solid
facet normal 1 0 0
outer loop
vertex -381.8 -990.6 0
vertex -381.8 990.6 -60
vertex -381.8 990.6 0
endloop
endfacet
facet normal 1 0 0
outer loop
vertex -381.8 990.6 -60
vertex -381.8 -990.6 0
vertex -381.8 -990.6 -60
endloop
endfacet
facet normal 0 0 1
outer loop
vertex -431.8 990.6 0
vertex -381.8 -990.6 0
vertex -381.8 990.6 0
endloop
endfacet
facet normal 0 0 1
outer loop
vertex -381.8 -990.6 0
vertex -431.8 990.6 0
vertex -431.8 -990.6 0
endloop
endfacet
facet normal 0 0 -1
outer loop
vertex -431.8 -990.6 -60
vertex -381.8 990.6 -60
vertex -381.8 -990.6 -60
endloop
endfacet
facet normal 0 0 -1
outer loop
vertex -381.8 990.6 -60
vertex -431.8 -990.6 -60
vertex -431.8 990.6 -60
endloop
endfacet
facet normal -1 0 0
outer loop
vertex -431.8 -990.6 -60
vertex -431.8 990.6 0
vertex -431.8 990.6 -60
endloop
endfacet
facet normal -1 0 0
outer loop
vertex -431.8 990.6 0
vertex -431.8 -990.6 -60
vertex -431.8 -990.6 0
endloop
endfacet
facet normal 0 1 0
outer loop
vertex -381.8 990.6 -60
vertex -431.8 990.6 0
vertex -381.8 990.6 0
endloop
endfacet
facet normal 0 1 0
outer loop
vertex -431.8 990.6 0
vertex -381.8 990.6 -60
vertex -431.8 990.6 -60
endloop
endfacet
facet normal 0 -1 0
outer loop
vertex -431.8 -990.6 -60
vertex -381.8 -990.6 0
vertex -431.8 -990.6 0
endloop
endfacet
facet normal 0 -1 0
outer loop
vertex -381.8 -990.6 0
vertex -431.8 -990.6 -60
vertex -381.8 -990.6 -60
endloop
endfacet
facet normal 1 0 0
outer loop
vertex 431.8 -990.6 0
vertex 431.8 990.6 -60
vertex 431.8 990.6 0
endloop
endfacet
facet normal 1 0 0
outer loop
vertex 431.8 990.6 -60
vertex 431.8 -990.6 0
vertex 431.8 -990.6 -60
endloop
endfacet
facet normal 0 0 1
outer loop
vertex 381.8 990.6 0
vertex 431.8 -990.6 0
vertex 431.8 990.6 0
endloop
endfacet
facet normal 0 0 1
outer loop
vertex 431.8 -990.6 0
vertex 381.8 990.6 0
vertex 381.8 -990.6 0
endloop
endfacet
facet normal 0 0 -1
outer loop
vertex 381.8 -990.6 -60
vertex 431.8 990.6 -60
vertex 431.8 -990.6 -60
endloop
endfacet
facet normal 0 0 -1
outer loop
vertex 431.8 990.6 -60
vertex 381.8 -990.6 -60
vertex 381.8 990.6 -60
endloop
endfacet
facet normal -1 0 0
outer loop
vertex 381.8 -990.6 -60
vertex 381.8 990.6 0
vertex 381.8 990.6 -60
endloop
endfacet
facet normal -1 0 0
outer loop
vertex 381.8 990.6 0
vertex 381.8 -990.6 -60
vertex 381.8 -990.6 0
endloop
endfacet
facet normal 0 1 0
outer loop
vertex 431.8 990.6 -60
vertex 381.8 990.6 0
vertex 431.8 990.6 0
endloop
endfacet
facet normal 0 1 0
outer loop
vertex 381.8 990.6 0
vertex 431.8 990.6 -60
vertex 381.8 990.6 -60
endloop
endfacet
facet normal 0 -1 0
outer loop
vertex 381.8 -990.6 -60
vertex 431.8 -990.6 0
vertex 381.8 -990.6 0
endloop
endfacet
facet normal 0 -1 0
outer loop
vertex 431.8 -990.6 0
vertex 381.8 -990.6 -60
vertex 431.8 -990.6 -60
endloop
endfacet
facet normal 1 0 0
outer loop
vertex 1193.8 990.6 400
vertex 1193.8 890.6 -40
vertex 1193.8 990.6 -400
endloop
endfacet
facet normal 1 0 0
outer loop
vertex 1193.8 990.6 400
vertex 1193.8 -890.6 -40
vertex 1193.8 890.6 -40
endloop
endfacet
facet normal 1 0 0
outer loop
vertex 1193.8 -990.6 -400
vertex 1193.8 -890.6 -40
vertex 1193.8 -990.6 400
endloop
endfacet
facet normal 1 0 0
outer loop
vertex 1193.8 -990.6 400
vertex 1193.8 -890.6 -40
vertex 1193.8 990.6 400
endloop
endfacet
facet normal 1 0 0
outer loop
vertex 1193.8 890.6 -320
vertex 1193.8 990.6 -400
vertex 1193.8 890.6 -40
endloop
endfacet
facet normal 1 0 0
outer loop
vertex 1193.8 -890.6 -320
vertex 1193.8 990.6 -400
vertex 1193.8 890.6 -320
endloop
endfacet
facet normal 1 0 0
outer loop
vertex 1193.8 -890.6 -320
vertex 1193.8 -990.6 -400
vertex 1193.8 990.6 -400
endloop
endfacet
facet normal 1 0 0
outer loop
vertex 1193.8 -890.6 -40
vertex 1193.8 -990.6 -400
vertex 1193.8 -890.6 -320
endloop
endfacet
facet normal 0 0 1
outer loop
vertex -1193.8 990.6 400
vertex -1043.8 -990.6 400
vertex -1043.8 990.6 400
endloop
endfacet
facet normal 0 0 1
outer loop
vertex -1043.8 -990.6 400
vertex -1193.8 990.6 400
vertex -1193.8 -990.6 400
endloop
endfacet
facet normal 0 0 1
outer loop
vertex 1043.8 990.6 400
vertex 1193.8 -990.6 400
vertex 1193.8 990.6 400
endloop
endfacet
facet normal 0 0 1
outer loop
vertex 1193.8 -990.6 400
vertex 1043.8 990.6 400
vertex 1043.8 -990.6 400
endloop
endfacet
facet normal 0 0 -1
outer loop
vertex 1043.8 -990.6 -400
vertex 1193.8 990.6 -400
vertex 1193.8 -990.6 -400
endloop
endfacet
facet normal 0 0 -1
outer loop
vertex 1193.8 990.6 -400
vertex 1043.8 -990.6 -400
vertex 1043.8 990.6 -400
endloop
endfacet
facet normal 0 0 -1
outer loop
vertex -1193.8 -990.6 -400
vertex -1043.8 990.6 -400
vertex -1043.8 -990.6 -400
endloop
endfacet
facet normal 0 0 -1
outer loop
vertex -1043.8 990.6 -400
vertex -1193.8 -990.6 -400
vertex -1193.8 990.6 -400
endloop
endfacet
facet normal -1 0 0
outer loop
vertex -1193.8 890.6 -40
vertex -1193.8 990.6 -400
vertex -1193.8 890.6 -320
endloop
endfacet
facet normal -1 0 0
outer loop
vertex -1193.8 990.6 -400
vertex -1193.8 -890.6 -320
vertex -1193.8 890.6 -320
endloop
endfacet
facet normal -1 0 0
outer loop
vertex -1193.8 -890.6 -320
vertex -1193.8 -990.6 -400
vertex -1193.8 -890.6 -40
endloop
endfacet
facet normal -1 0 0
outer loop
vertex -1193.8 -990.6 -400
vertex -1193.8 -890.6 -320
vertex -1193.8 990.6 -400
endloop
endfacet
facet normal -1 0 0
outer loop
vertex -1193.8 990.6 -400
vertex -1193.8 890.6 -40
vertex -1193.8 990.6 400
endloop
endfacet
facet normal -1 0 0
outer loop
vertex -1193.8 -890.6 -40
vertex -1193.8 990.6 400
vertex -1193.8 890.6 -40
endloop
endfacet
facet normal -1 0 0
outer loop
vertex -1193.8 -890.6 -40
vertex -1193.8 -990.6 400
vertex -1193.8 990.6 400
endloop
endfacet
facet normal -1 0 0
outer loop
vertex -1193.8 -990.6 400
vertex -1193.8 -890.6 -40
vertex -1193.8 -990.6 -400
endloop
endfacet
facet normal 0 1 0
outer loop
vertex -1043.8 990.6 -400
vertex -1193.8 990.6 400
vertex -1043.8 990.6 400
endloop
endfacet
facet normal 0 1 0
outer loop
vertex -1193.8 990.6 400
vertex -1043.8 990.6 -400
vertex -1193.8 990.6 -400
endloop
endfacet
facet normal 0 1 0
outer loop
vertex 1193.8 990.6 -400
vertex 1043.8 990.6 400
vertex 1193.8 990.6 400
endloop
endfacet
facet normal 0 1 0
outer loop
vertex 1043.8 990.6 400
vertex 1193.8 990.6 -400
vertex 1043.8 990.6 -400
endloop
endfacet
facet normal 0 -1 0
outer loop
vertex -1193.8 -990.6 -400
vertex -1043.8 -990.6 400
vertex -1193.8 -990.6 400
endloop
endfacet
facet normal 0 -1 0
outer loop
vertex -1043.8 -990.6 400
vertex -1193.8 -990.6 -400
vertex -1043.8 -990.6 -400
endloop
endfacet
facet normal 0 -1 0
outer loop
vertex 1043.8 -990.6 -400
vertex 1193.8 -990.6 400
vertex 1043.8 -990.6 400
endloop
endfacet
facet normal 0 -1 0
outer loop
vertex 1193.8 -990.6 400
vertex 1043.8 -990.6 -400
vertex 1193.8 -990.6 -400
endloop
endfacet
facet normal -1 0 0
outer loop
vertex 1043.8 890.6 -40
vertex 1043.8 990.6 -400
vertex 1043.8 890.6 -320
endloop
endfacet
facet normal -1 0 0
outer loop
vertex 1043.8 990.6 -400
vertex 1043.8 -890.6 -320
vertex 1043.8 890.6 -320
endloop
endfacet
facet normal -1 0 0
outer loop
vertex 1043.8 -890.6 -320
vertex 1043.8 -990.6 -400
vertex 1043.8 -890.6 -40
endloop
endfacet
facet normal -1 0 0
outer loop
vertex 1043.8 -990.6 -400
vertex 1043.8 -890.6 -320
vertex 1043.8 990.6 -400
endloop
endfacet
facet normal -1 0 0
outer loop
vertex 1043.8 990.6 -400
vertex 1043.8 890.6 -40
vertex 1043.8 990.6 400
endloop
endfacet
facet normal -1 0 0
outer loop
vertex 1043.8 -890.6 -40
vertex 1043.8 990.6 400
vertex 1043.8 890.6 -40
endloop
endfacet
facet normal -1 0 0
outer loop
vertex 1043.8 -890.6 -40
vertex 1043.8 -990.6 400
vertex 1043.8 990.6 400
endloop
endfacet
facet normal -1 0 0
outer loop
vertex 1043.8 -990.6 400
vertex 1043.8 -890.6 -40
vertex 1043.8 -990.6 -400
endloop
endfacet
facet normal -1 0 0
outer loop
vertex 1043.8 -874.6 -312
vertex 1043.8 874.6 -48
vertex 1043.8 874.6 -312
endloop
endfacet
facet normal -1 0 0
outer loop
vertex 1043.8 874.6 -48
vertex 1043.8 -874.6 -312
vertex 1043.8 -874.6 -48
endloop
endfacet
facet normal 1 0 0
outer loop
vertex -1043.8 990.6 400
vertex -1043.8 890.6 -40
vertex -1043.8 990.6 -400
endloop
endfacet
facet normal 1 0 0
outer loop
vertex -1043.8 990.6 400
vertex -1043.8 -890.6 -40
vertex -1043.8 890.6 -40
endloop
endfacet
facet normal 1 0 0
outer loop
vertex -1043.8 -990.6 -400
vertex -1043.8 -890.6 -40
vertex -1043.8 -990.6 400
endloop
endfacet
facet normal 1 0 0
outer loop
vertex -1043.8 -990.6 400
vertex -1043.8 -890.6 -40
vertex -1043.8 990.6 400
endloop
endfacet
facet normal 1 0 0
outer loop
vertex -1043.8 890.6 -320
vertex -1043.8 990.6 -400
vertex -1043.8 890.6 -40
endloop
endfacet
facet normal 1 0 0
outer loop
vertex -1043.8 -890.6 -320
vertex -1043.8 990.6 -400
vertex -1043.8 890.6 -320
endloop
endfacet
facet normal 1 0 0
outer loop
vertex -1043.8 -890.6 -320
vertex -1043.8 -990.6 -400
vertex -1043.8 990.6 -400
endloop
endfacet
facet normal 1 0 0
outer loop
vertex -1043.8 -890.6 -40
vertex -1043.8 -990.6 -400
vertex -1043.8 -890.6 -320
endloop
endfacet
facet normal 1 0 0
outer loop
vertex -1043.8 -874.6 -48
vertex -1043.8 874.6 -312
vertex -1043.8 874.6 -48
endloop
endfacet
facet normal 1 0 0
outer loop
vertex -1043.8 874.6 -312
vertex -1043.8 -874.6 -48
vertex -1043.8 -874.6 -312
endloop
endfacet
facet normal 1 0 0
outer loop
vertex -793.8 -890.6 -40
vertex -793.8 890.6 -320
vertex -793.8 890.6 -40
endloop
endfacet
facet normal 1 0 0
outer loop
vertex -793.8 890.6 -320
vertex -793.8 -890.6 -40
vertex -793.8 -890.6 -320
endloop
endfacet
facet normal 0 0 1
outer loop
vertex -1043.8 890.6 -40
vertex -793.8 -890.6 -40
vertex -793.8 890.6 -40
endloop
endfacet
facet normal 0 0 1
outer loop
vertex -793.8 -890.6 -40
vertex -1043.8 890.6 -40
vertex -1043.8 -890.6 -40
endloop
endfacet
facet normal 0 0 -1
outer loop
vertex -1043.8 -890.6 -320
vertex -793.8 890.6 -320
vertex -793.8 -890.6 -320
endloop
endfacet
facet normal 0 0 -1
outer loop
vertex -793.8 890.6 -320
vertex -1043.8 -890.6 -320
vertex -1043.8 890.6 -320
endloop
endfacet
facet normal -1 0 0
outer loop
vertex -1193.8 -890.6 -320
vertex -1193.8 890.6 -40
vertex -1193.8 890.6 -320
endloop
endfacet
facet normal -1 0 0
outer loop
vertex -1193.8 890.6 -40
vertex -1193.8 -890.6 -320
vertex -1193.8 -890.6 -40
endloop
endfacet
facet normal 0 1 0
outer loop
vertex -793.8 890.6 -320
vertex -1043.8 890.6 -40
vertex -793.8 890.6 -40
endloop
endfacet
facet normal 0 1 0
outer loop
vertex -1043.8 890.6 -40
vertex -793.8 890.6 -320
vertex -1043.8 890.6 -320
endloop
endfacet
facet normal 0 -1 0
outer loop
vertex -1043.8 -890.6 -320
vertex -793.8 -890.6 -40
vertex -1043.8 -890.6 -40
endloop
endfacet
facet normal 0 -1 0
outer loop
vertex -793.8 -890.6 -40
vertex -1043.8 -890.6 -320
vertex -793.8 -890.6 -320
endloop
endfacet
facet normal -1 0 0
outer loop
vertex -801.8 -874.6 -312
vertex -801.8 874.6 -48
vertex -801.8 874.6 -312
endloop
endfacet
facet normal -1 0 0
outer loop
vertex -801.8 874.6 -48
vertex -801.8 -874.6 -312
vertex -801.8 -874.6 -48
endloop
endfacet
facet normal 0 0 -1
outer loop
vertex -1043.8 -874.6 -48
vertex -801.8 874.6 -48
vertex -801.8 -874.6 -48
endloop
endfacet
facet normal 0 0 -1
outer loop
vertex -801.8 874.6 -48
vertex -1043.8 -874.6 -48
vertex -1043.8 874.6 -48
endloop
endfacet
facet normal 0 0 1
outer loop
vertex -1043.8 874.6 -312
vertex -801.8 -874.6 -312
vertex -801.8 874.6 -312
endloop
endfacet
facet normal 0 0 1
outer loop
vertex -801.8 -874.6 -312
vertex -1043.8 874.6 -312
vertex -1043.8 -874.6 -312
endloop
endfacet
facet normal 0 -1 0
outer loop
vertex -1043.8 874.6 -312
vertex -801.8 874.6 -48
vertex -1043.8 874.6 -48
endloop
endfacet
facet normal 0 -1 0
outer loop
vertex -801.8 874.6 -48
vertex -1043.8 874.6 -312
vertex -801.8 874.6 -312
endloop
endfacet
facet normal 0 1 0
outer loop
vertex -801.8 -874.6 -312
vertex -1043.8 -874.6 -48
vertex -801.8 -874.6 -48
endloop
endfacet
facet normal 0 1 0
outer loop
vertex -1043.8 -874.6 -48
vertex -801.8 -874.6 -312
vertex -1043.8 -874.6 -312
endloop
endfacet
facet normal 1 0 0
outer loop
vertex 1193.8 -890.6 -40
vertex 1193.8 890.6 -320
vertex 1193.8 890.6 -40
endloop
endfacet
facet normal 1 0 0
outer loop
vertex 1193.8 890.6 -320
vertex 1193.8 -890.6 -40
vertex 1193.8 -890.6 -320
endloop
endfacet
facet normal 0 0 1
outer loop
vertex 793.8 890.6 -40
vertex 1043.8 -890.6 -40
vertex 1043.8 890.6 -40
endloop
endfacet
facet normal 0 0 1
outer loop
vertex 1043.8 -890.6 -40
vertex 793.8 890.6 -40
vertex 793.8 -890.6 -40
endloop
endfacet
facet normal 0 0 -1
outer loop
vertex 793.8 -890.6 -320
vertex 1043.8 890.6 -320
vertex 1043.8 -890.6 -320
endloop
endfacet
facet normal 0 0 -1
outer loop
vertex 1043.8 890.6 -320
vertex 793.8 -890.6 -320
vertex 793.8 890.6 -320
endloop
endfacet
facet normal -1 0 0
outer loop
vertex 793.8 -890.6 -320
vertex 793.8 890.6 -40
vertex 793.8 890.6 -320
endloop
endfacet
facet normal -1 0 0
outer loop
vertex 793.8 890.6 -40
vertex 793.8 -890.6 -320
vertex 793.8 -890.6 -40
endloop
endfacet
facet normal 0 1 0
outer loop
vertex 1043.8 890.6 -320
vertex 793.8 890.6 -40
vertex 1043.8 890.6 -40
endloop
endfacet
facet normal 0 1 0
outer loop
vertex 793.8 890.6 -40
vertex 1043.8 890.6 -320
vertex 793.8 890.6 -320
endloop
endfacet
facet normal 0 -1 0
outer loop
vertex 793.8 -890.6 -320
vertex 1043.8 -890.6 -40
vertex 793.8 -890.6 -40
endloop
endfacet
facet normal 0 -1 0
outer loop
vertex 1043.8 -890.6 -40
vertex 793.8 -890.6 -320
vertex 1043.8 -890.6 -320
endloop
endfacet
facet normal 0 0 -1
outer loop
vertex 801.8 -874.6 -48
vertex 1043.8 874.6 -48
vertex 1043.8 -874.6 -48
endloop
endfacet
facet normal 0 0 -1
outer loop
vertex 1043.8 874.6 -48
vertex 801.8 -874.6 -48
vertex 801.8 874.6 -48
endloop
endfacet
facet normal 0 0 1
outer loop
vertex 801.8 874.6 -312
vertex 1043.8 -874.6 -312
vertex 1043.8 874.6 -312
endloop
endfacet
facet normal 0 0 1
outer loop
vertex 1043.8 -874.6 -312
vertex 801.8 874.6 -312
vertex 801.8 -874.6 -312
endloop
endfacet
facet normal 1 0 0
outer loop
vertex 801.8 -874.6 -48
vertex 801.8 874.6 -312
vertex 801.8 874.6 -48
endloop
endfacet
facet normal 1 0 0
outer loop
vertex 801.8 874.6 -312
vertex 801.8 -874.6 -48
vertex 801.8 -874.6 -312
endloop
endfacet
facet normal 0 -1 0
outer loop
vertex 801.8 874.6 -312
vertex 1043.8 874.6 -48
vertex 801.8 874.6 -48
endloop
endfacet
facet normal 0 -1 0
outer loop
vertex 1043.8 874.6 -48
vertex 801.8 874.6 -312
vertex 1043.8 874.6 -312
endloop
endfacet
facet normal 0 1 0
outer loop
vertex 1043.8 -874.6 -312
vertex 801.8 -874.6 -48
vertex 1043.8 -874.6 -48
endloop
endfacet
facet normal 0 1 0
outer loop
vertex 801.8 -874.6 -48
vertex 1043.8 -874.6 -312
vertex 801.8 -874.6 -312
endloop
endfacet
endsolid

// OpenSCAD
// ====================================================================================
// REVOLUTIONARY TECHNOLOGY COMPANY & UNIVERSITY OF WASHINGTON DEPARTMENT OF PHYSICS
// Module: silverado_md_all_beds.scad (Parametric Multi-Industry Short-Bed Matrix)
// Updates: Optimized for 143.5" Wheelbase Extended King Cab & 6.5-Foot Cargo Limits
// Center Origin (0,0,0) = Mid-point of King Cab-to-Axle (CA) Longitudinal Frame Interface
// ====================================================================================

$fn = 100;

// --- Master Industrial Upfit Selector ---
INDUSTRIAL_BED_VARIANT = 2; // 1=Tow, 2=Utility, 3=EMT, 4=Fire, 5=Police, 6=Dump, 7=Lumber, 8=Box, 9=Military, 10=Anti-Air

// --- Short-Bed Fleet Geometry Parameter Tables ---
inch_to_mm         = 25.4;
bed_length         = 78.0 * inch_to_mm;  // Scaled down to exactly 1981.20 mm for short-bed upfits
bed_width          = 94.0 * inch_to_mm;  // Standard wide-track commercial dually width [INDEX]
mating_rail_w      = 34.0 * inch_to_mm;  // 863.60 mm standard straight truck rail track [INDEX]
tool_box_width     = 400.00;             // Compressed pocket size fitting shorter wheelbase
winch_clearance    = 100.00;             // Mandatory rear winch notch offset [INDEX]

variant_manifest = ["TOW_TRUCK_ROLLBACK", "UTILITY_SERVICE_BODY", "EMT_AMBULANCE_POD", "FIRE_PUMPER_CORE", "POLICE_RIOT_CAGE", "VOCATIONAL_DUMP_BED", "LUMBER_STAKE_BED", "DRY_FREIGHT_BOX", "TACTICAL_MILITARY_DECK", "ANTI_AIR_TURRET_BASE"];

module universal_chassis_mating_subframe() {
    echo(str("COMPILING SHORT-BED INDUSTAL UPFIT PACK: ", variant_manifest[INDUSTRIAL_BED_VARIANT-1]));
    for (side = [-1, 1]) {
        translate([side * (mating_rail_w/2 - 25), 0, -30])
            cube([50, bed_length, 60], center=true);
    }
}

module integrated_gm_tool_lockers() {
    // Hangs below the shorter side-skirts to protect the GM Fleet Industrial Toolkit [INDEX]
    color("DarkSlateGrey") {
        for (side = [-1, 1]) {
            translate([side * (bed_width/2 - tool_box_width/2), 0, -180]) {
                difference() {
                    cube([tool_box_width, bed_length - 200, 280], center=true); // Shortened locker footprint
                    cube([tool_box_width - 16, bed_length - 232, 264], center=true);
                }
            }
        }
    }
}

module deploy_short_cargo_geometry() {
    difference() {
        union() {
            if (INDUSTRIAL_BED_VARIANT == 1) { // Tow Truck rollback plate short spec
                color("Silver") translate() cube([bed_width, bed_length, 12], center=true);
            }
            else if (INDUSTRIAL_BED_VARIANT == 2) { // Utility Body (OtterBox Compartments) [INDEX]
                color("DimGrey") difference() {
                    cube([bed_width, bed_length, 800], center=true);
                    cube([bed_width - 300, bed_length + 10, 810], center=true);
                }
            }
            else if (INDUSTRIAL_BED_VARIANT == 6) { // Vocational Dump Pan
                color("DarkSlateGrey") translate() difference() {
                    cube([bed_width, bed_length, 600], center=true);
                    translate() cube([bed_width - 16, bed_length - 16, 620], center=true);
                }
            }
            // Other variants fallback directly into the standardized short-envelope box blocks
            else {
                color("White") translate() cube([bed_width, bed_length, 800], center=true);
            }
        }
        
        // --- FRAME-FIRST COMPLIANCE REAR NOTCH ---
        // Clears the 15,000-lb rear recovery winch cable line pass-through [INDEX]
        translate([0, -bed_length/2 + winch_clearance/2, -100])
            cube([320.0, winch_clearance + 2, 500.0], center=true);
    }
}

// --- Composite Structural Short-Bed Execution Matrix ---
union() {
    universal_chassis_mating_subframe();
    deploy_short_cargo_geometry();
    integrated_gm_tool_lockers();
}
